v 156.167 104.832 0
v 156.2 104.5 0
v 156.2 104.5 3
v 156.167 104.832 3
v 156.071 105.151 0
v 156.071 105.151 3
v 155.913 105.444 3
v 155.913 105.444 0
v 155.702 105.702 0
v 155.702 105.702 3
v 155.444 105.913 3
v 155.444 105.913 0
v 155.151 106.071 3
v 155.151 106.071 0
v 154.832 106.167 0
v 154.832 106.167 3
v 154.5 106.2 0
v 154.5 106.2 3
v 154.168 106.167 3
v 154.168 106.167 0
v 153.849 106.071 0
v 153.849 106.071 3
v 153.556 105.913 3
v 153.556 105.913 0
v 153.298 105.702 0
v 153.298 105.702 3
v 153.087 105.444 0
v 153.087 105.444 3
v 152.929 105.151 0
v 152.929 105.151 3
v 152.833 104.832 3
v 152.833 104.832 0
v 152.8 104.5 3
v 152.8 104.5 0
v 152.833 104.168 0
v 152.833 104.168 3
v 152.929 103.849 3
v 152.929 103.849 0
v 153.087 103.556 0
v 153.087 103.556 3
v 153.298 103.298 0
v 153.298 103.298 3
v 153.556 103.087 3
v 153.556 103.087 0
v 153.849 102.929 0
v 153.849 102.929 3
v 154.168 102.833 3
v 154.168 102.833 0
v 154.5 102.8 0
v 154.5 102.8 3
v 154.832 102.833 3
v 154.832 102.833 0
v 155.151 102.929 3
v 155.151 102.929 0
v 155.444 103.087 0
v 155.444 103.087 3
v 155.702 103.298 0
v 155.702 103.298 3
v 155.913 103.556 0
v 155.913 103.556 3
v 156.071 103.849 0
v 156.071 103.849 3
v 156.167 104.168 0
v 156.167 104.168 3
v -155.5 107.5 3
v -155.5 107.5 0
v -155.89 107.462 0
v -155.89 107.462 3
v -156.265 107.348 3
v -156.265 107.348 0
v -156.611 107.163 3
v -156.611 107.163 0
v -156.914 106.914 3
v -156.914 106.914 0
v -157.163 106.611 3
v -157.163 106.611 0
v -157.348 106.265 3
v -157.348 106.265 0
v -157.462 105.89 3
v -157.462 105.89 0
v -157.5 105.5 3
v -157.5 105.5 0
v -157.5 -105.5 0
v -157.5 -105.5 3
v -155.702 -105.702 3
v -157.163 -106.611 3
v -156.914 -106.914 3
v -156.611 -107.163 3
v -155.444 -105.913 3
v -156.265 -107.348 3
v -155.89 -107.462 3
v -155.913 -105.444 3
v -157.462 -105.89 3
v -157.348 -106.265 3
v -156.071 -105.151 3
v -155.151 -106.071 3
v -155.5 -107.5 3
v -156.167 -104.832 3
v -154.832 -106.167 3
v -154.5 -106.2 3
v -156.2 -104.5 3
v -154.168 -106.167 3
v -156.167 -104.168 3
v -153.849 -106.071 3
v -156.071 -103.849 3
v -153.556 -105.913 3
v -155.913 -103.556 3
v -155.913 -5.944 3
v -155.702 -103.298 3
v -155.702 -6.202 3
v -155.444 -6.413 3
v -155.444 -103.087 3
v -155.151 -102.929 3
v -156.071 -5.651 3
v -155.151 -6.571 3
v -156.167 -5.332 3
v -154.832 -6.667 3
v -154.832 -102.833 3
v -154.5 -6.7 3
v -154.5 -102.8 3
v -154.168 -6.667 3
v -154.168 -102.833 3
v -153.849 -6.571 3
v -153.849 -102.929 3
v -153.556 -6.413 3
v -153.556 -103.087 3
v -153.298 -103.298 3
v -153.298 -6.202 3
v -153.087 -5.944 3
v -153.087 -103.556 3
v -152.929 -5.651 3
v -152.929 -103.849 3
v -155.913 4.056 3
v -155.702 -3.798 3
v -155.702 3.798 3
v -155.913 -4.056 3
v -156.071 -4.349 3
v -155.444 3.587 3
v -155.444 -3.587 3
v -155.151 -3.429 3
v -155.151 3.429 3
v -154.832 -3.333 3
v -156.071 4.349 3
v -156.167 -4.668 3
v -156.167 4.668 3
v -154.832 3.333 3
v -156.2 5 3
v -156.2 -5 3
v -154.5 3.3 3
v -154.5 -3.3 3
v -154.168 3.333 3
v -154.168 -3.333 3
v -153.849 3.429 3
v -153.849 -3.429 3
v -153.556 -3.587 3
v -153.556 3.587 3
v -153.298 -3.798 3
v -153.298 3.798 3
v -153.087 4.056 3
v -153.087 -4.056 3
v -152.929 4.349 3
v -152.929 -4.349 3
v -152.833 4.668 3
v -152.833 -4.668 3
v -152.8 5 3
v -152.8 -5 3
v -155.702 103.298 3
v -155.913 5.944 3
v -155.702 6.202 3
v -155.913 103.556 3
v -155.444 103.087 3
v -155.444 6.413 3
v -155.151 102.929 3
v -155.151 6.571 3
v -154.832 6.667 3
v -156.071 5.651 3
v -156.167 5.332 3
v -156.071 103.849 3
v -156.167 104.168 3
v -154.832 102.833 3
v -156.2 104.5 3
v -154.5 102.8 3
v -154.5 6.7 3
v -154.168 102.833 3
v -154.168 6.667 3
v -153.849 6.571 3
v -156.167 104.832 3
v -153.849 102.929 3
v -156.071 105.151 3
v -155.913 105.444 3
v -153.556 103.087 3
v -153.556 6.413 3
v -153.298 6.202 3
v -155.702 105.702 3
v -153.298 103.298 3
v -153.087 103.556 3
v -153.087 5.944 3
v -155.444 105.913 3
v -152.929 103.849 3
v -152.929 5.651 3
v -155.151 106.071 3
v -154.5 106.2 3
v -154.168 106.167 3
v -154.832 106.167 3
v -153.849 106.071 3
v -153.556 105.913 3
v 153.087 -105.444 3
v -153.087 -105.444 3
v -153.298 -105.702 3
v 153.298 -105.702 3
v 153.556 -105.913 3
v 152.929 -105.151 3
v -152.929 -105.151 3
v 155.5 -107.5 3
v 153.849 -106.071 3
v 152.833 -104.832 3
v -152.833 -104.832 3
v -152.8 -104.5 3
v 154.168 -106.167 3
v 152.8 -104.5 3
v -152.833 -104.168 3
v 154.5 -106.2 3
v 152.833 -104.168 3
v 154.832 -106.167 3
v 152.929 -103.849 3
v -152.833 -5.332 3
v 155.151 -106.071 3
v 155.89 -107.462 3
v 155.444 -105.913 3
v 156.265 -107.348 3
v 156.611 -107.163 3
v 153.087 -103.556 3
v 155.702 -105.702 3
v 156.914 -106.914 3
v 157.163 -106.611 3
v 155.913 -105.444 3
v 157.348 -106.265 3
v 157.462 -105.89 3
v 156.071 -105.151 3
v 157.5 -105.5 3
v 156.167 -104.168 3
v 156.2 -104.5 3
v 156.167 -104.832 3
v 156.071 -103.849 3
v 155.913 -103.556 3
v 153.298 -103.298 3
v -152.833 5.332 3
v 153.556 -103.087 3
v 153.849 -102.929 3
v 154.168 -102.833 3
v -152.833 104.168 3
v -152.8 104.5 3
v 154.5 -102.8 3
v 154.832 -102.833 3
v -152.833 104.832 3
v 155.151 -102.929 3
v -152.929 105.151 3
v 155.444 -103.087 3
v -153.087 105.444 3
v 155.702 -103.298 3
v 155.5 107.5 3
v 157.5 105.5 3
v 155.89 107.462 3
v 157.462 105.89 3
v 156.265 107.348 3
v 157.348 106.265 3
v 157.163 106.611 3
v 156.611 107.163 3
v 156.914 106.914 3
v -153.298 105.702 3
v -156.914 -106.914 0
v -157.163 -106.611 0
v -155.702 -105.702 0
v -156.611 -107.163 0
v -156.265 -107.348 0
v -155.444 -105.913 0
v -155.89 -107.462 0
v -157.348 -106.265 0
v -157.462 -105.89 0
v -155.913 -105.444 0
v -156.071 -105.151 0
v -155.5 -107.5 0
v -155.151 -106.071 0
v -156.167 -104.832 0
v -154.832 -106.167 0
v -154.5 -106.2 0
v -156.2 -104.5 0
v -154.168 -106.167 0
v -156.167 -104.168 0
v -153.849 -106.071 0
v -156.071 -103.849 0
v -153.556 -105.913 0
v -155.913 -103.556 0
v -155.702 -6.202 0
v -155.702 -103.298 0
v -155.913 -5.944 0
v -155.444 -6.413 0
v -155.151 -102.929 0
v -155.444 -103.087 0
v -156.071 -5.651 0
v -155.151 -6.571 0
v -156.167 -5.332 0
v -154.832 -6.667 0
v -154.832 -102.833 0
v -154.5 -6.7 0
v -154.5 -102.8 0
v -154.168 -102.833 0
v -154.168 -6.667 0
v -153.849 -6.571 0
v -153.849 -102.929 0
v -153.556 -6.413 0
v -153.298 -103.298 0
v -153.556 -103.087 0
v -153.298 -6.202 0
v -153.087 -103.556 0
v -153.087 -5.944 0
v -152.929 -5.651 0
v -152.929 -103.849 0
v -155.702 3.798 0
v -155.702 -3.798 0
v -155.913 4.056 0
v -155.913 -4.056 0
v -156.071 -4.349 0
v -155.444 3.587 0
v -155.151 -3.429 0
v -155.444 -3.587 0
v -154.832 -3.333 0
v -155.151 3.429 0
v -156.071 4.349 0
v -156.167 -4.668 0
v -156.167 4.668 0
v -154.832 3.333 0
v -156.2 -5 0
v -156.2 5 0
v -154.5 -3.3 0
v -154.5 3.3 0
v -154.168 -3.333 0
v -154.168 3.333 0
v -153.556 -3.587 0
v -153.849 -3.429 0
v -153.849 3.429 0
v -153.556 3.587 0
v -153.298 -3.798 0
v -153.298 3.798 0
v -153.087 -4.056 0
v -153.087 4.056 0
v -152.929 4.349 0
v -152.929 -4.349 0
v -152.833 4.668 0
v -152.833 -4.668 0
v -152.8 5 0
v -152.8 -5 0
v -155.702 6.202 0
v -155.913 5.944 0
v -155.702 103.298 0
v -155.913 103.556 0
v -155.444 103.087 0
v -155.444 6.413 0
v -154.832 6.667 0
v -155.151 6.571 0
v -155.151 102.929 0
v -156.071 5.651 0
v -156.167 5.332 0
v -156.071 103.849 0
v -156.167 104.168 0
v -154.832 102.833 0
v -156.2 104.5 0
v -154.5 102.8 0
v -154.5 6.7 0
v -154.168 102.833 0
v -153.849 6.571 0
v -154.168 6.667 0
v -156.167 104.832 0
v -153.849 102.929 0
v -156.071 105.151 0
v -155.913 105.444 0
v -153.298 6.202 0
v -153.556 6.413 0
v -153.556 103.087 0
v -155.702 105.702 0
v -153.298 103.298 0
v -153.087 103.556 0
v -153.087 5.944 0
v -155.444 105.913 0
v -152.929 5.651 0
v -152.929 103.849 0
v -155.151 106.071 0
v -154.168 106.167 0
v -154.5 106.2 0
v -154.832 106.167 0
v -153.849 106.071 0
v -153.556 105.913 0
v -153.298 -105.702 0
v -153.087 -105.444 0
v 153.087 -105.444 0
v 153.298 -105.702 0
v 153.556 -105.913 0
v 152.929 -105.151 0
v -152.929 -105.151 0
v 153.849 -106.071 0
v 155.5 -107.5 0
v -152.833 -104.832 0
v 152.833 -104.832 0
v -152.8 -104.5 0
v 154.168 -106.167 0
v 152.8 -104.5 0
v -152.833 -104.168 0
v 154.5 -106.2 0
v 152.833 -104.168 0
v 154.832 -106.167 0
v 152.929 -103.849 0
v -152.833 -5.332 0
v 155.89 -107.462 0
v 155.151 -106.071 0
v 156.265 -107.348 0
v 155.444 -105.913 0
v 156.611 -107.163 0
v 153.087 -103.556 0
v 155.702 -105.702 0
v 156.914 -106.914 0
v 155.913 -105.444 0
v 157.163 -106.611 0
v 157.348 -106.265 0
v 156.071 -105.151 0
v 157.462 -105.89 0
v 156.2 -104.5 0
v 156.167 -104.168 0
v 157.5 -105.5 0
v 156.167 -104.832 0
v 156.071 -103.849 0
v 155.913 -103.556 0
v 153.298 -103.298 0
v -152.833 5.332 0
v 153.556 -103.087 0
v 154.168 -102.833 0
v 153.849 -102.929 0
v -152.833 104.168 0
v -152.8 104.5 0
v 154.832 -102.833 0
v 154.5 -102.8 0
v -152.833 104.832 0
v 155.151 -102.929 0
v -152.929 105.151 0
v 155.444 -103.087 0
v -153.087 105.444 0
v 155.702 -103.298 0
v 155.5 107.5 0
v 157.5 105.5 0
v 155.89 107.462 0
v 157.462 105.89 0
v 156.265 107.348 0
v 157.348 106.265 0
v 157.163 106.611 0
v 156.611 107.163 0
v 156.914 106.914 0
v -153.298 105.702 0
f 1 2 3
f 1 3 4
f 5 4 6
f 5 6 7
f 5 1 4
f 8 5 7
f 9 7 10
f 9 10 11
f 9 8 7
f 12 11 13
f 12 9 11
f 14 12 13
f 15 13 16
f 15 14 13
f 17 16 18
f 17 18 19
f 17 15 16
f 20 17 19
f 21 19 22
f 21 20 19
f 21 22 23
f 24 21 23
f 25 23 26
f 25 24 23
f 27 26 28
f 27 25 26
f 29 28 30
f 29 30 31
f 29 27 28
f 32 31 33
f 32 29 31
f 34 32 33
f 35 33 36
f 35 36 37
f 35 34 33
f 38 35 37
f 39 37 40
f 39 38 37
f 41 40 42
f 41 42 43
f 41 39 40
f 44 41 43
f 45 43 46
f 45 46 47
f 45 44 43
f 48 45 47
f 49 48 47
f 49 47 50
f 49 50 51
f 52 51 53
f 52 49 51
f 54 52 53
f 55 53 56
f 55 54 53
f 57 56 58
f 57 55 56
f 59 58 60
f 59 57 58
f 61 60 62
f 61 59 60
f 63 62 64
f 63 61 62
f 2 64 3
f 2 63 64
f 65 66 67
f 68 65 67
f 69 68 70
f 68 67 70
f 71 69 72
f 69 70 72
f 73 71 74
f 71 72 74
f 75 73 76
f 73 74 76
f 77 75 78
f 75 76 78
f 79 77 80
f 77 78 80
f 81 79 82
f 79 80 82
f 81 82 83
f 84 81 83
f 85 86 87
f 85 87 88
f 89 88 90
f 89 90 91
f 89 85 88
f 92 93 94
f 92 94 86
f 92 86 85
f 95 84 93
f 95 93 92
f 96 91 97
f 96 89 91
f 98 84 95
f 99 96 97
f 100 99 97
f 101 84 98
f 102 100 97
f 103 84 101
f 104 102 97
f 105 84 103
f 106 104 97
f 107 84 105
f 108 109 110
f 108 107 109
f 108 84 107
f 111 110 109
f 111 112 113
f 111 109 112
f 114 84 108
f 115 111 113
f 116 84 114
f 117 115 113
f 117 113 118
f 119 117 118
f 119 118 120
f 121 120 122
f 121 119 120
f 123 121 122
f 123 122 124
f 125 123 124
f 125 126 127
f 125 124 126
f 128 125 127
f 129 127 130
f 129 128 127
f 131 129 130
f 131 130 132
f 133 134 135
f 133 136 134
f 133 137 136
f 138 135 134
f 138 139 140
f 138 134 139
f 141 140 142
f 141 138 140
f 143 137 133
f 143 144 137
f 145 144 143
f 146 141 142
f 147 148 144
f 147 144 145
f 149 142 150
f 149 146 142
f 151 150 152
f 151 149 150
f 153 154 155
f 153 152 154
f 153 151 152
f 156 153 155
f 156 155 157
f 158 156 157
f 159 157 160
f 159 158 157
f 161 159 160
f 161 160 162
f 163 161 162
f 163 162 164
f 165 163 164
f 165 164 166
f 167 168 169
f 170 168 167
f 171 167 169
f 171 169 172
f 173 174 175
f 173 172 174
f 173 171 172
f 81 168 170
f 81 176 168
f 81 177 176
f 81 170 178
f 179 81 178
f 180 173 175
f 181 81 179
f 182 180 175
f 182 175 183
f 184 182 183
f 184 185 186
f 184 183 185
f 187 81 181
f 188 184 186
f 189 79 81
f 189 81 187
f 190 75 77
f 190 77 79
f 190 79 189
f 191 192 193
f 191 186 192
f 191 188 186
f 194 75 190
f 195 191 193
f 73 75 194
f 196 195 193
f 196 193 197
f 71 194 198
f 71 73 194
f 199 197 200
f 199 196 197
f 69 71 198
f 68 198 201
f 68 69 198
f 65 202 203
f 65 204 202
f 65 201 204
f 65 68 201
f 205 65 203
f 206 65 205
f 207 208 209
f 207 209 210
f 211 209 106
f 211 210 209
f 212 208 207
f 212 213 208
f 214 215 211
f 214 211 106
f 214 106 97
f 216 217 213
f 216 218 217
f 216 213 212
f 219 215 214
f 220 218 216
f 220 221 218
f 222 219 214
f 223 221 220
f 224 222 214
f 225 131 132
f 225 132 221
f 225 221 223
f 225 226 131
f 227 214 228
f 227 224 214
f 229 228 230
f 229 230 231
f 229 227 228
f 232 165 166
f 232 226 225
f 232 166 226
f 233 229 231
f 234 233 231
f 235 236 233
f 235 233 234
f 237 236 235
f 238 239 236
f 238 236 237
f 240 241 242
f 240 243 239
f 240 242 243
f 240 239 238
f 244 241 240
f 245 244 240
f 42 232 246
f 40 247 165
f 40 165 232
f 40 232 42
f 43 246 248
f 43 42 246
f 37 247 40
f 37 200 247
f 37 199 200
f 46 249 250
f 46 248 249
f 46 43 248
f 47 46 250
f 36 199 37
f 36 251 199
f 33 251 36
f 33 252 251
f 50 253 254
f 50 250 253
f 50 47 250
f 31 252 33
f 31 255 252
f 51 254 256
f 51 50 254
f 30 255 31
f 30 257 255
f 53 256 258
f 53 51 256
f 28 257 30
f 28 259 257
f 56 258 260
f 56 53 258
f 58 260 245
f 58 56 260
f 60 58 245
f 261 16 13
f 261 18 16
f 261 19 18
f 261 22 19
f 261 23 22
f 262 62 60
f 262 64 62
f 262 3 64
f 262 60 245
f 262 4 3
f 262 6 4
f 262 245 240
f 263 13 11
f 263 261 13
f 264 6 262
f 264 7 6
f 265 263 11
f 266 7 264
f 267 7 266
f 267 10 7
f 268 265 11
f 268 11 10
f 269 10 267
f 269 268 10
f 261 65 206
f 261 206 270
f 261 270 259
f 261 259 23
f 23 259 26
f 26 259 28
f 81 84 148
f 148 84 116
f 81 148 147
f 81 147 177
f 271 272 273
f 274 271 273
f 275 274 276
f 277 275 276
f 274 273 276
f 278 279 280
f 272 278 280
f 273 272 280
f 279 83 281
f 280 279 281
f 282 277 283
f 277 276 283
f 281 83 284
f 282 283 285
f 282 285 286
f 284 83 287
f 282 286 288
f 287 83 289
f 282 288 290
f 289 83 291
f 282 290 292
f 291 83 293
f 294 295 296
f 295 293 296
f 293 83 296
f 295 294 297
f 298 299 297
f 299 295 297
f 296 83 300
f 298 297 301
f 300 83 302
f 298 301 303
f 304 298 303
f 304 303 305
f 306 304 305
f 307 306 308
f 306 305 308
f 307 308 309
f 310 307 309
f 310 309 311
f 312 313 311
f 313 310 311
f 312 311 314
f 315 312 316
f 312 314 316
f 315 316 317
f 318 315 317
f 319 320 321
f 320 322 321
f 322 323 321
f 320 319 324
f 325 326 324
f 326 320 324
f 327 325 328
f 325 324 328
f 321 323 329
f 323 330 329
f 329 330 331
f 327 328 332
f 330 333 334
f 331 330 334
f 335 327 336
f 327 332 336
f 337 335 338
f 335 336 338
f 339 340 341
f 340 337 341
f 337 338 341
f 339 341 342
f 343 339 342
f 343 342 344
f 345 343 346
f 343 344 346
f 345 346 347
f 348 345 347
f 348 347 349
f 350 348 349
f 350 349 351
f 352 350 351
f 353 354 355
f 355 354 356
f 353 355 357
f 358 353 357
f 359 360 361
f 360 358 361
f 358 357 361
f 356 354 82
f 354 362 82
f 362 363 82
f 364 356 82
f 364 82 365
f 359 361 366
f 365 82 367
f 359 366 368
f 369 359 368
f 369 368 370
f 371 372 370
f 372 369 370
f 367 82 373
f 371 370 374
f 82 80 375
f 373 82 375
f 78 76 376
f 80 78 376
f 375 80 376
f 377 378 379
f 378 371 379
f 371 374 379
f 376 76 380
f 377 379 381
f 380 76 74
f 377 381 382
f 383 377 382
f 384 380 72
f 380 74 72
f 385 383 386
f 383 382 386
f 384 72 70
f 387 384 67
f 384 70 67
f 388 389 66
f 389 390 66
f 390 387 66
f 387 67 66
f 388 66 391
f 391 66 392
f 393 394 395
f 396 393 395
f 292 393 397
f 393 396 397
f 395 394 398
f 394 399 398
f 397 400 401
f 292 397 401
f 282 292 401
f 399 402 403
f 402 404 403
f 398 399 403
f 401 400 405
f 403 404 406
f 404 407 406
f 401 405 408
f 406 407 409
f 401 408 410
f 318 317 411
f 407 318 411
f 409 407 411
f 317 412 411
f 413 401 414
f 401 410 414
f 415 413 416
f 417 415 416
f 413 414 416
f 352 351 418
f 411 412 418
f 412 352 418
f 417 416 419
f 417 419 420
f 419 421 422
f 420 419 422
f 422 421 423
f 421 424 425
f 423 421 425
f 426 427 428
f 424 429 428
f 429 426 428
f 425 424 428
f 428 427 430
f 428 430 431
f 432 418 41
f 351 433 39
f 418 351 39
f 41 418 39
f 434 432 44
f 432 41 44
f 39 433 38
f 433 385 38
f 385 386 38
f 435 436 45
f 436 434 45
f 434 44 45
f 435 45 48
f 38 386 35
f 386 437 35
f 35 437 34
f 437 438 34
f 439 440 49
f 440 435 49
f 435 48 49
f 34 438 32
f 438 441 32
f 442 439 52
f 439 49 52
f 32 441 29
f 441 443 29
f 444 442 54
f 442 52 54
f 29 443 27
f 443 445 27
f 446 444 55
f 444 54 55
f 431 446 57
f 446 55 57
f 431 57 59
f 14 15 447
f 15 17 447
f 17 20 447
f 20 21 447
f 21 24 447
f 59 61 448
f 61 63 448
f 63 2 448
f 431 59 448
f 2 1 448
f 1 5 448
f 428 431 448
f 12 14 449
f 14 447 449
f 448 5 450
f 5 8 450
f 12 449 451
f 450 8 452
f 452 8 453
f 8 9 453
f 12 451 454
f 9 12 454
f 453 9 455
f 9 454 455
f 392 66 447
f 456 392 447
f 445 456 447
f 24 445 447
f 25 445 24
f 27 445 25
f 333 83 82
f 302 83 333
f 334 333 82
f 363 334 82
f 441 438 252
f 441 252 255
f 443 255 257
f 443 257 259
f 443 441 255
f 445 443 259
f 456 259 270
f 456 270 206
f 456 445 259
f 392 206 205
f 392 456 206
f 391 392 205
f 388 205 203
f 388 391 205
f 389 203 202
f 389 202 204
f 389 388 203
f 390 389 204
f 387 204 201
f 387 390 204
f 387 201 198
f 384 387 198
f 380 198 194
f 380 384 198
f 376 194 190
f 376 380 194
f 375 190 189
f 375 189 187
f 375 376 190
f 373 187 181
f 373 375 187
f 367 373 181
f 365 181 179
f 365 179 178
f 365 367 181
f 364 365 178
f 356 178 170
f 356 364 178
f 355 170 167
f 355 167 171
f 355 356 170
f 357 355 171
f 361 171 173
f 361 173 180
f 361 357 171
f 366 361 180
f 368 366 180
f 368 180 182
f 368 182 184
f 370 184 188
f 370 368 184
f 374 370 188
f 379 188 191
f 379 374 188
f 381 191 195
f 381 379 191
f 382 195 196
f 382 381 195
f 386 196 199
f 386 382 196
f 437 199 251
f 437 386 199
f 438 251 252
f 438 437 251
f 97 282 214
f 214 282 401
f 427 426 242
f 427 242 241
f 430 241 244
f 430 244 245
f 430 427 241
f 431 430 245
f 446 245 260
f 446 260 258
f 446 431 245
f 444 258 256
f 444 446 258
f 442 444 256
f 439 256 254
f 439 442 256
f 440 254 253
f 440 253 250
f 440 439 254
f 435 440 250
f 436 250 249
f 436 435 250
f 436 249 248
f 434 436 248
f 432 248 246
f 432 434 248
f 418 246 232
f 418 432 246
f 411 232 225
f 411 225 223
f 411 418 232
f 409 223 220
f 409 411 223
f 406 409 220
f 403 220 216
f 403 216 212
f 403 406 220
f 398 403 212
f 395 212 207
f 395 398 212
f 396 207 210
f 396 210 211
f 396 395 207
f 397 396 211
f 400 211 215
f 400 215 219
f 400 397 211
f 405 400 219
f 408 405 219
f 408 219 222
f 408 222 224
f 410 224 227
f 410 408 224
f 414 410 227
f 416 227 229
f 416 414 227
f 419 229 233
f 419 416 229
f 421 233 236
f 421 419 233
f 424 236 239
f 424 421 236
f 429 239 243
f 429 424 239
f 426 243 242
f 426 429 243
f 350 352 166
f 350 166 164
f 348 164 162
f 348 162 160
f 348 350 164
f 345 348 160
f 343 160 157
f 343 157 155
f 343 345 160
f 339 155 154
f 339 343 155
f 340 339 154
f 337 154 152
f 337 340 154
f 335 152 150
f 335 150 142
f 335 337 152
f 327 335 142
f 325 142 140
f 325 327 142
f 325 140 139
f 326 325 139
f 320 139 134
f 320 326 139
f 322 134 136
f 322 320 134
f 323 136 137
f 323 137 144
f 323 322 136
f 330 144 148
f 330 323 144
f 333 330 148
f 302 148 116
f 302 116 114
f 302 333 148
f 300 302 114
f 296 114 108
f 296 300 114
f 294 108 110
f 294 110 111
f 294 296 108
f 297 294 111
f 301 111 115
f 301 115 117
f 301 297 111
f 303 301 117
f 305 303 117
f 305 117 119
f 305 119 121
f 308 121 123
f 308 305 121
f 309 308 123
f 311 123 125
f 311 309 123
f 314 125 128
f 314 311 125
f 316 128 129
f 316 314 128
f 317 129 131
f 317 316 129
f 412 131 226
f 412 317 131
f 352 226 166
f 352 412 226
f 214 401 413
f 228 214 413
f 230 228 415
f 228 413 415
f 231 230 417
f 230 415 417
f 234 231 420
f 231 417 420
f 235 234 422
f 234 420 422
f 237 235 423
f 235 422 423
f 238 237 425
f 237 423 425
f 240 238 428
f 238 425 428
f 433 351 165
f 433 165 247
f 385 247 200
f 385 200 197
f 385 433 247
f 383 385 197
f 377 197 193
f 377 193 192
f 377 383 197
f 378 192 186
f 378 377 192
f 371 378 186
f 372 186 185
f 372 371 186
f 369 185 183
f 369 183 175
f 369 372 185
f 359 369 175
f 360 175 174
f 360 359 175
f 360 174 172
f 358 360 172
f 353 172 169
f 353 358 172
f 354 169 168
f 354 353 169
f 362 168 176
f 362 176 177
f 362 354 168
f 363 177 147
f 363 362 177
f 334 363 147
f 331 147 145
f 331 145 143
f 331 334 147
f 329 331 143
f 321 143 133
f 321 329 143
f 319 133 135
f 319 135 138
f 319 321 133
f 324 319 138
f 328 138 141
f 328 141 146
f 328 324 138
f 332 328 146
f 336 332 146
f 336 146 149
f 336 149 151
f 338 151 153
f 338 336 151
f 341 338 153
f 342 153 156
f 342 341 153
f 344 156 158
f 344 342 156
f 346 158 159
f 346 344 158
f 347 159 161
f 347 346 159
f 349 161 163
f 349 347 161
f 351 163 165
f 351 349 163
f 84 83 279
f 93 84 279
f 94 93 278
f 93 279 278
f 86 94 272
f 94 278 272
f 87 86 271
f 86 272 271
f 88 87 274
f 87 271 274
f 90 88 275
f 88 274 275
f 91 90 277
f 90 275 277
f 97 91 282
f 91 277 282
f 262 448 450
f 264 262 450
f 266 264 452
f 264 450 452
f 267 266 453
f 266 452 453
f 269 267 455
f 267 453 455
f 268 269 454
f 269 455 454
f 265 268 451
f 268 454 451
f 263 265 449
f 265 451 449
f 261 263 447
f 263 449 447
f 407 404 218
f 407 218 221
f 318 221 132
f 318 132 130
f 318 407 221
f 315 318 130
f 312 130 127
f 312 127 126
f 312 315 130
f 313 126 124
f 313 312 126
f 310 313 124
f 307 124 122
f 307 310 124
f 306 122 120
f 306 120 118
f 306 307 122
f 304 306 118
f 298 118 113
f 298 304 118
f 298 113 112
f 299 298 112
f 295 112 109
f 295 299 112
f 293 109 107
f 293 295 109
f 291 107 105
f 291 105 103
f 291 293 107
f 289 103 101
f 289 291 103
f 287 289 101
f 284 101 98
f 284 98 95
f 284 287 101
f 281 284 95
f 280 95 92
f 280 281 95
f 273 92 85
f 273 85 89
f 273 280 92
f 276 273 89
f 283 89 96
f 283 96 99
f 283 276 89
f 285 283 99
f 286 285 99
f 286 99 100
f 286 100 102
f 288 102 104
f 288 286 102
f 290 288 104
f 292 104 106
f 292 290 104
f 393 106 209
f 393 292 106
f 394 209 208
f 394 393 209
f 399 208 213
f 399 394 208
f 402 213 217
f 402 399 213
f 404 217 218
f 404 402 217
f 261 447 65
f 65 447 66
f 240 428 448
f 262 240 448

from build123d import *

# Parameters (mm, degrees)
F0_R     = 1.7
F1_DEPTH = 3


with BuildPart() as f1:
    # F0 (on Top) → F1 (new body)
    with BuildSketch(Plane.XY):
        with BuildLine():
            Line((155.5, 107.5), (-155.5, 107.5))
            ThreePointArc((-155.5, 107.5), (-156.914214, 106.914214), (-157.5, 105.5))
            Line((-157.5, 105.5), (-157.5, -105.5))
            ThreePointArc((-157.5, -105.5), (-156.914214, -106.914214), (-155.5, -107.5))
            Line((-155.5, -107.5), (155.5, -107.5))
            ThreePointArc((155.5, -107.5), (156.914214, -106.914214), (157.5, -105.5))
            Line((157.5, -105.5), (157.5, 105.5))
            ThreePointArc((157.5, 105.5), (156.914214, 106.914214), (155.5, 107.5))
        make_face()
        with Locations((-154.5, -104.5)):
            Circle(F0_R, mode=Mode.SUBTRACT)
        with Locations((-154.5, -5)):
            Circle(F0_R, mode=Mode.SUBTRACT)
        with Locations((154.5, -104.5)):
            Circle(F0_R, mode=Mode.SUBTRACT)
        with Locations((-154.5, 5)):
            Circle(F0_R, mode=Mode.SUBTRACT)
        with Locations((-154.5, 104.5)):
            Circle(F0_R, mode=Mode.SUBTRACT)
        with Locations((154.5, 104.5)):
            Circle(F0_R, mode=Mode.SUBTRACT)
    extrude(amount=F1_DEPTH)


solid = f1.part
